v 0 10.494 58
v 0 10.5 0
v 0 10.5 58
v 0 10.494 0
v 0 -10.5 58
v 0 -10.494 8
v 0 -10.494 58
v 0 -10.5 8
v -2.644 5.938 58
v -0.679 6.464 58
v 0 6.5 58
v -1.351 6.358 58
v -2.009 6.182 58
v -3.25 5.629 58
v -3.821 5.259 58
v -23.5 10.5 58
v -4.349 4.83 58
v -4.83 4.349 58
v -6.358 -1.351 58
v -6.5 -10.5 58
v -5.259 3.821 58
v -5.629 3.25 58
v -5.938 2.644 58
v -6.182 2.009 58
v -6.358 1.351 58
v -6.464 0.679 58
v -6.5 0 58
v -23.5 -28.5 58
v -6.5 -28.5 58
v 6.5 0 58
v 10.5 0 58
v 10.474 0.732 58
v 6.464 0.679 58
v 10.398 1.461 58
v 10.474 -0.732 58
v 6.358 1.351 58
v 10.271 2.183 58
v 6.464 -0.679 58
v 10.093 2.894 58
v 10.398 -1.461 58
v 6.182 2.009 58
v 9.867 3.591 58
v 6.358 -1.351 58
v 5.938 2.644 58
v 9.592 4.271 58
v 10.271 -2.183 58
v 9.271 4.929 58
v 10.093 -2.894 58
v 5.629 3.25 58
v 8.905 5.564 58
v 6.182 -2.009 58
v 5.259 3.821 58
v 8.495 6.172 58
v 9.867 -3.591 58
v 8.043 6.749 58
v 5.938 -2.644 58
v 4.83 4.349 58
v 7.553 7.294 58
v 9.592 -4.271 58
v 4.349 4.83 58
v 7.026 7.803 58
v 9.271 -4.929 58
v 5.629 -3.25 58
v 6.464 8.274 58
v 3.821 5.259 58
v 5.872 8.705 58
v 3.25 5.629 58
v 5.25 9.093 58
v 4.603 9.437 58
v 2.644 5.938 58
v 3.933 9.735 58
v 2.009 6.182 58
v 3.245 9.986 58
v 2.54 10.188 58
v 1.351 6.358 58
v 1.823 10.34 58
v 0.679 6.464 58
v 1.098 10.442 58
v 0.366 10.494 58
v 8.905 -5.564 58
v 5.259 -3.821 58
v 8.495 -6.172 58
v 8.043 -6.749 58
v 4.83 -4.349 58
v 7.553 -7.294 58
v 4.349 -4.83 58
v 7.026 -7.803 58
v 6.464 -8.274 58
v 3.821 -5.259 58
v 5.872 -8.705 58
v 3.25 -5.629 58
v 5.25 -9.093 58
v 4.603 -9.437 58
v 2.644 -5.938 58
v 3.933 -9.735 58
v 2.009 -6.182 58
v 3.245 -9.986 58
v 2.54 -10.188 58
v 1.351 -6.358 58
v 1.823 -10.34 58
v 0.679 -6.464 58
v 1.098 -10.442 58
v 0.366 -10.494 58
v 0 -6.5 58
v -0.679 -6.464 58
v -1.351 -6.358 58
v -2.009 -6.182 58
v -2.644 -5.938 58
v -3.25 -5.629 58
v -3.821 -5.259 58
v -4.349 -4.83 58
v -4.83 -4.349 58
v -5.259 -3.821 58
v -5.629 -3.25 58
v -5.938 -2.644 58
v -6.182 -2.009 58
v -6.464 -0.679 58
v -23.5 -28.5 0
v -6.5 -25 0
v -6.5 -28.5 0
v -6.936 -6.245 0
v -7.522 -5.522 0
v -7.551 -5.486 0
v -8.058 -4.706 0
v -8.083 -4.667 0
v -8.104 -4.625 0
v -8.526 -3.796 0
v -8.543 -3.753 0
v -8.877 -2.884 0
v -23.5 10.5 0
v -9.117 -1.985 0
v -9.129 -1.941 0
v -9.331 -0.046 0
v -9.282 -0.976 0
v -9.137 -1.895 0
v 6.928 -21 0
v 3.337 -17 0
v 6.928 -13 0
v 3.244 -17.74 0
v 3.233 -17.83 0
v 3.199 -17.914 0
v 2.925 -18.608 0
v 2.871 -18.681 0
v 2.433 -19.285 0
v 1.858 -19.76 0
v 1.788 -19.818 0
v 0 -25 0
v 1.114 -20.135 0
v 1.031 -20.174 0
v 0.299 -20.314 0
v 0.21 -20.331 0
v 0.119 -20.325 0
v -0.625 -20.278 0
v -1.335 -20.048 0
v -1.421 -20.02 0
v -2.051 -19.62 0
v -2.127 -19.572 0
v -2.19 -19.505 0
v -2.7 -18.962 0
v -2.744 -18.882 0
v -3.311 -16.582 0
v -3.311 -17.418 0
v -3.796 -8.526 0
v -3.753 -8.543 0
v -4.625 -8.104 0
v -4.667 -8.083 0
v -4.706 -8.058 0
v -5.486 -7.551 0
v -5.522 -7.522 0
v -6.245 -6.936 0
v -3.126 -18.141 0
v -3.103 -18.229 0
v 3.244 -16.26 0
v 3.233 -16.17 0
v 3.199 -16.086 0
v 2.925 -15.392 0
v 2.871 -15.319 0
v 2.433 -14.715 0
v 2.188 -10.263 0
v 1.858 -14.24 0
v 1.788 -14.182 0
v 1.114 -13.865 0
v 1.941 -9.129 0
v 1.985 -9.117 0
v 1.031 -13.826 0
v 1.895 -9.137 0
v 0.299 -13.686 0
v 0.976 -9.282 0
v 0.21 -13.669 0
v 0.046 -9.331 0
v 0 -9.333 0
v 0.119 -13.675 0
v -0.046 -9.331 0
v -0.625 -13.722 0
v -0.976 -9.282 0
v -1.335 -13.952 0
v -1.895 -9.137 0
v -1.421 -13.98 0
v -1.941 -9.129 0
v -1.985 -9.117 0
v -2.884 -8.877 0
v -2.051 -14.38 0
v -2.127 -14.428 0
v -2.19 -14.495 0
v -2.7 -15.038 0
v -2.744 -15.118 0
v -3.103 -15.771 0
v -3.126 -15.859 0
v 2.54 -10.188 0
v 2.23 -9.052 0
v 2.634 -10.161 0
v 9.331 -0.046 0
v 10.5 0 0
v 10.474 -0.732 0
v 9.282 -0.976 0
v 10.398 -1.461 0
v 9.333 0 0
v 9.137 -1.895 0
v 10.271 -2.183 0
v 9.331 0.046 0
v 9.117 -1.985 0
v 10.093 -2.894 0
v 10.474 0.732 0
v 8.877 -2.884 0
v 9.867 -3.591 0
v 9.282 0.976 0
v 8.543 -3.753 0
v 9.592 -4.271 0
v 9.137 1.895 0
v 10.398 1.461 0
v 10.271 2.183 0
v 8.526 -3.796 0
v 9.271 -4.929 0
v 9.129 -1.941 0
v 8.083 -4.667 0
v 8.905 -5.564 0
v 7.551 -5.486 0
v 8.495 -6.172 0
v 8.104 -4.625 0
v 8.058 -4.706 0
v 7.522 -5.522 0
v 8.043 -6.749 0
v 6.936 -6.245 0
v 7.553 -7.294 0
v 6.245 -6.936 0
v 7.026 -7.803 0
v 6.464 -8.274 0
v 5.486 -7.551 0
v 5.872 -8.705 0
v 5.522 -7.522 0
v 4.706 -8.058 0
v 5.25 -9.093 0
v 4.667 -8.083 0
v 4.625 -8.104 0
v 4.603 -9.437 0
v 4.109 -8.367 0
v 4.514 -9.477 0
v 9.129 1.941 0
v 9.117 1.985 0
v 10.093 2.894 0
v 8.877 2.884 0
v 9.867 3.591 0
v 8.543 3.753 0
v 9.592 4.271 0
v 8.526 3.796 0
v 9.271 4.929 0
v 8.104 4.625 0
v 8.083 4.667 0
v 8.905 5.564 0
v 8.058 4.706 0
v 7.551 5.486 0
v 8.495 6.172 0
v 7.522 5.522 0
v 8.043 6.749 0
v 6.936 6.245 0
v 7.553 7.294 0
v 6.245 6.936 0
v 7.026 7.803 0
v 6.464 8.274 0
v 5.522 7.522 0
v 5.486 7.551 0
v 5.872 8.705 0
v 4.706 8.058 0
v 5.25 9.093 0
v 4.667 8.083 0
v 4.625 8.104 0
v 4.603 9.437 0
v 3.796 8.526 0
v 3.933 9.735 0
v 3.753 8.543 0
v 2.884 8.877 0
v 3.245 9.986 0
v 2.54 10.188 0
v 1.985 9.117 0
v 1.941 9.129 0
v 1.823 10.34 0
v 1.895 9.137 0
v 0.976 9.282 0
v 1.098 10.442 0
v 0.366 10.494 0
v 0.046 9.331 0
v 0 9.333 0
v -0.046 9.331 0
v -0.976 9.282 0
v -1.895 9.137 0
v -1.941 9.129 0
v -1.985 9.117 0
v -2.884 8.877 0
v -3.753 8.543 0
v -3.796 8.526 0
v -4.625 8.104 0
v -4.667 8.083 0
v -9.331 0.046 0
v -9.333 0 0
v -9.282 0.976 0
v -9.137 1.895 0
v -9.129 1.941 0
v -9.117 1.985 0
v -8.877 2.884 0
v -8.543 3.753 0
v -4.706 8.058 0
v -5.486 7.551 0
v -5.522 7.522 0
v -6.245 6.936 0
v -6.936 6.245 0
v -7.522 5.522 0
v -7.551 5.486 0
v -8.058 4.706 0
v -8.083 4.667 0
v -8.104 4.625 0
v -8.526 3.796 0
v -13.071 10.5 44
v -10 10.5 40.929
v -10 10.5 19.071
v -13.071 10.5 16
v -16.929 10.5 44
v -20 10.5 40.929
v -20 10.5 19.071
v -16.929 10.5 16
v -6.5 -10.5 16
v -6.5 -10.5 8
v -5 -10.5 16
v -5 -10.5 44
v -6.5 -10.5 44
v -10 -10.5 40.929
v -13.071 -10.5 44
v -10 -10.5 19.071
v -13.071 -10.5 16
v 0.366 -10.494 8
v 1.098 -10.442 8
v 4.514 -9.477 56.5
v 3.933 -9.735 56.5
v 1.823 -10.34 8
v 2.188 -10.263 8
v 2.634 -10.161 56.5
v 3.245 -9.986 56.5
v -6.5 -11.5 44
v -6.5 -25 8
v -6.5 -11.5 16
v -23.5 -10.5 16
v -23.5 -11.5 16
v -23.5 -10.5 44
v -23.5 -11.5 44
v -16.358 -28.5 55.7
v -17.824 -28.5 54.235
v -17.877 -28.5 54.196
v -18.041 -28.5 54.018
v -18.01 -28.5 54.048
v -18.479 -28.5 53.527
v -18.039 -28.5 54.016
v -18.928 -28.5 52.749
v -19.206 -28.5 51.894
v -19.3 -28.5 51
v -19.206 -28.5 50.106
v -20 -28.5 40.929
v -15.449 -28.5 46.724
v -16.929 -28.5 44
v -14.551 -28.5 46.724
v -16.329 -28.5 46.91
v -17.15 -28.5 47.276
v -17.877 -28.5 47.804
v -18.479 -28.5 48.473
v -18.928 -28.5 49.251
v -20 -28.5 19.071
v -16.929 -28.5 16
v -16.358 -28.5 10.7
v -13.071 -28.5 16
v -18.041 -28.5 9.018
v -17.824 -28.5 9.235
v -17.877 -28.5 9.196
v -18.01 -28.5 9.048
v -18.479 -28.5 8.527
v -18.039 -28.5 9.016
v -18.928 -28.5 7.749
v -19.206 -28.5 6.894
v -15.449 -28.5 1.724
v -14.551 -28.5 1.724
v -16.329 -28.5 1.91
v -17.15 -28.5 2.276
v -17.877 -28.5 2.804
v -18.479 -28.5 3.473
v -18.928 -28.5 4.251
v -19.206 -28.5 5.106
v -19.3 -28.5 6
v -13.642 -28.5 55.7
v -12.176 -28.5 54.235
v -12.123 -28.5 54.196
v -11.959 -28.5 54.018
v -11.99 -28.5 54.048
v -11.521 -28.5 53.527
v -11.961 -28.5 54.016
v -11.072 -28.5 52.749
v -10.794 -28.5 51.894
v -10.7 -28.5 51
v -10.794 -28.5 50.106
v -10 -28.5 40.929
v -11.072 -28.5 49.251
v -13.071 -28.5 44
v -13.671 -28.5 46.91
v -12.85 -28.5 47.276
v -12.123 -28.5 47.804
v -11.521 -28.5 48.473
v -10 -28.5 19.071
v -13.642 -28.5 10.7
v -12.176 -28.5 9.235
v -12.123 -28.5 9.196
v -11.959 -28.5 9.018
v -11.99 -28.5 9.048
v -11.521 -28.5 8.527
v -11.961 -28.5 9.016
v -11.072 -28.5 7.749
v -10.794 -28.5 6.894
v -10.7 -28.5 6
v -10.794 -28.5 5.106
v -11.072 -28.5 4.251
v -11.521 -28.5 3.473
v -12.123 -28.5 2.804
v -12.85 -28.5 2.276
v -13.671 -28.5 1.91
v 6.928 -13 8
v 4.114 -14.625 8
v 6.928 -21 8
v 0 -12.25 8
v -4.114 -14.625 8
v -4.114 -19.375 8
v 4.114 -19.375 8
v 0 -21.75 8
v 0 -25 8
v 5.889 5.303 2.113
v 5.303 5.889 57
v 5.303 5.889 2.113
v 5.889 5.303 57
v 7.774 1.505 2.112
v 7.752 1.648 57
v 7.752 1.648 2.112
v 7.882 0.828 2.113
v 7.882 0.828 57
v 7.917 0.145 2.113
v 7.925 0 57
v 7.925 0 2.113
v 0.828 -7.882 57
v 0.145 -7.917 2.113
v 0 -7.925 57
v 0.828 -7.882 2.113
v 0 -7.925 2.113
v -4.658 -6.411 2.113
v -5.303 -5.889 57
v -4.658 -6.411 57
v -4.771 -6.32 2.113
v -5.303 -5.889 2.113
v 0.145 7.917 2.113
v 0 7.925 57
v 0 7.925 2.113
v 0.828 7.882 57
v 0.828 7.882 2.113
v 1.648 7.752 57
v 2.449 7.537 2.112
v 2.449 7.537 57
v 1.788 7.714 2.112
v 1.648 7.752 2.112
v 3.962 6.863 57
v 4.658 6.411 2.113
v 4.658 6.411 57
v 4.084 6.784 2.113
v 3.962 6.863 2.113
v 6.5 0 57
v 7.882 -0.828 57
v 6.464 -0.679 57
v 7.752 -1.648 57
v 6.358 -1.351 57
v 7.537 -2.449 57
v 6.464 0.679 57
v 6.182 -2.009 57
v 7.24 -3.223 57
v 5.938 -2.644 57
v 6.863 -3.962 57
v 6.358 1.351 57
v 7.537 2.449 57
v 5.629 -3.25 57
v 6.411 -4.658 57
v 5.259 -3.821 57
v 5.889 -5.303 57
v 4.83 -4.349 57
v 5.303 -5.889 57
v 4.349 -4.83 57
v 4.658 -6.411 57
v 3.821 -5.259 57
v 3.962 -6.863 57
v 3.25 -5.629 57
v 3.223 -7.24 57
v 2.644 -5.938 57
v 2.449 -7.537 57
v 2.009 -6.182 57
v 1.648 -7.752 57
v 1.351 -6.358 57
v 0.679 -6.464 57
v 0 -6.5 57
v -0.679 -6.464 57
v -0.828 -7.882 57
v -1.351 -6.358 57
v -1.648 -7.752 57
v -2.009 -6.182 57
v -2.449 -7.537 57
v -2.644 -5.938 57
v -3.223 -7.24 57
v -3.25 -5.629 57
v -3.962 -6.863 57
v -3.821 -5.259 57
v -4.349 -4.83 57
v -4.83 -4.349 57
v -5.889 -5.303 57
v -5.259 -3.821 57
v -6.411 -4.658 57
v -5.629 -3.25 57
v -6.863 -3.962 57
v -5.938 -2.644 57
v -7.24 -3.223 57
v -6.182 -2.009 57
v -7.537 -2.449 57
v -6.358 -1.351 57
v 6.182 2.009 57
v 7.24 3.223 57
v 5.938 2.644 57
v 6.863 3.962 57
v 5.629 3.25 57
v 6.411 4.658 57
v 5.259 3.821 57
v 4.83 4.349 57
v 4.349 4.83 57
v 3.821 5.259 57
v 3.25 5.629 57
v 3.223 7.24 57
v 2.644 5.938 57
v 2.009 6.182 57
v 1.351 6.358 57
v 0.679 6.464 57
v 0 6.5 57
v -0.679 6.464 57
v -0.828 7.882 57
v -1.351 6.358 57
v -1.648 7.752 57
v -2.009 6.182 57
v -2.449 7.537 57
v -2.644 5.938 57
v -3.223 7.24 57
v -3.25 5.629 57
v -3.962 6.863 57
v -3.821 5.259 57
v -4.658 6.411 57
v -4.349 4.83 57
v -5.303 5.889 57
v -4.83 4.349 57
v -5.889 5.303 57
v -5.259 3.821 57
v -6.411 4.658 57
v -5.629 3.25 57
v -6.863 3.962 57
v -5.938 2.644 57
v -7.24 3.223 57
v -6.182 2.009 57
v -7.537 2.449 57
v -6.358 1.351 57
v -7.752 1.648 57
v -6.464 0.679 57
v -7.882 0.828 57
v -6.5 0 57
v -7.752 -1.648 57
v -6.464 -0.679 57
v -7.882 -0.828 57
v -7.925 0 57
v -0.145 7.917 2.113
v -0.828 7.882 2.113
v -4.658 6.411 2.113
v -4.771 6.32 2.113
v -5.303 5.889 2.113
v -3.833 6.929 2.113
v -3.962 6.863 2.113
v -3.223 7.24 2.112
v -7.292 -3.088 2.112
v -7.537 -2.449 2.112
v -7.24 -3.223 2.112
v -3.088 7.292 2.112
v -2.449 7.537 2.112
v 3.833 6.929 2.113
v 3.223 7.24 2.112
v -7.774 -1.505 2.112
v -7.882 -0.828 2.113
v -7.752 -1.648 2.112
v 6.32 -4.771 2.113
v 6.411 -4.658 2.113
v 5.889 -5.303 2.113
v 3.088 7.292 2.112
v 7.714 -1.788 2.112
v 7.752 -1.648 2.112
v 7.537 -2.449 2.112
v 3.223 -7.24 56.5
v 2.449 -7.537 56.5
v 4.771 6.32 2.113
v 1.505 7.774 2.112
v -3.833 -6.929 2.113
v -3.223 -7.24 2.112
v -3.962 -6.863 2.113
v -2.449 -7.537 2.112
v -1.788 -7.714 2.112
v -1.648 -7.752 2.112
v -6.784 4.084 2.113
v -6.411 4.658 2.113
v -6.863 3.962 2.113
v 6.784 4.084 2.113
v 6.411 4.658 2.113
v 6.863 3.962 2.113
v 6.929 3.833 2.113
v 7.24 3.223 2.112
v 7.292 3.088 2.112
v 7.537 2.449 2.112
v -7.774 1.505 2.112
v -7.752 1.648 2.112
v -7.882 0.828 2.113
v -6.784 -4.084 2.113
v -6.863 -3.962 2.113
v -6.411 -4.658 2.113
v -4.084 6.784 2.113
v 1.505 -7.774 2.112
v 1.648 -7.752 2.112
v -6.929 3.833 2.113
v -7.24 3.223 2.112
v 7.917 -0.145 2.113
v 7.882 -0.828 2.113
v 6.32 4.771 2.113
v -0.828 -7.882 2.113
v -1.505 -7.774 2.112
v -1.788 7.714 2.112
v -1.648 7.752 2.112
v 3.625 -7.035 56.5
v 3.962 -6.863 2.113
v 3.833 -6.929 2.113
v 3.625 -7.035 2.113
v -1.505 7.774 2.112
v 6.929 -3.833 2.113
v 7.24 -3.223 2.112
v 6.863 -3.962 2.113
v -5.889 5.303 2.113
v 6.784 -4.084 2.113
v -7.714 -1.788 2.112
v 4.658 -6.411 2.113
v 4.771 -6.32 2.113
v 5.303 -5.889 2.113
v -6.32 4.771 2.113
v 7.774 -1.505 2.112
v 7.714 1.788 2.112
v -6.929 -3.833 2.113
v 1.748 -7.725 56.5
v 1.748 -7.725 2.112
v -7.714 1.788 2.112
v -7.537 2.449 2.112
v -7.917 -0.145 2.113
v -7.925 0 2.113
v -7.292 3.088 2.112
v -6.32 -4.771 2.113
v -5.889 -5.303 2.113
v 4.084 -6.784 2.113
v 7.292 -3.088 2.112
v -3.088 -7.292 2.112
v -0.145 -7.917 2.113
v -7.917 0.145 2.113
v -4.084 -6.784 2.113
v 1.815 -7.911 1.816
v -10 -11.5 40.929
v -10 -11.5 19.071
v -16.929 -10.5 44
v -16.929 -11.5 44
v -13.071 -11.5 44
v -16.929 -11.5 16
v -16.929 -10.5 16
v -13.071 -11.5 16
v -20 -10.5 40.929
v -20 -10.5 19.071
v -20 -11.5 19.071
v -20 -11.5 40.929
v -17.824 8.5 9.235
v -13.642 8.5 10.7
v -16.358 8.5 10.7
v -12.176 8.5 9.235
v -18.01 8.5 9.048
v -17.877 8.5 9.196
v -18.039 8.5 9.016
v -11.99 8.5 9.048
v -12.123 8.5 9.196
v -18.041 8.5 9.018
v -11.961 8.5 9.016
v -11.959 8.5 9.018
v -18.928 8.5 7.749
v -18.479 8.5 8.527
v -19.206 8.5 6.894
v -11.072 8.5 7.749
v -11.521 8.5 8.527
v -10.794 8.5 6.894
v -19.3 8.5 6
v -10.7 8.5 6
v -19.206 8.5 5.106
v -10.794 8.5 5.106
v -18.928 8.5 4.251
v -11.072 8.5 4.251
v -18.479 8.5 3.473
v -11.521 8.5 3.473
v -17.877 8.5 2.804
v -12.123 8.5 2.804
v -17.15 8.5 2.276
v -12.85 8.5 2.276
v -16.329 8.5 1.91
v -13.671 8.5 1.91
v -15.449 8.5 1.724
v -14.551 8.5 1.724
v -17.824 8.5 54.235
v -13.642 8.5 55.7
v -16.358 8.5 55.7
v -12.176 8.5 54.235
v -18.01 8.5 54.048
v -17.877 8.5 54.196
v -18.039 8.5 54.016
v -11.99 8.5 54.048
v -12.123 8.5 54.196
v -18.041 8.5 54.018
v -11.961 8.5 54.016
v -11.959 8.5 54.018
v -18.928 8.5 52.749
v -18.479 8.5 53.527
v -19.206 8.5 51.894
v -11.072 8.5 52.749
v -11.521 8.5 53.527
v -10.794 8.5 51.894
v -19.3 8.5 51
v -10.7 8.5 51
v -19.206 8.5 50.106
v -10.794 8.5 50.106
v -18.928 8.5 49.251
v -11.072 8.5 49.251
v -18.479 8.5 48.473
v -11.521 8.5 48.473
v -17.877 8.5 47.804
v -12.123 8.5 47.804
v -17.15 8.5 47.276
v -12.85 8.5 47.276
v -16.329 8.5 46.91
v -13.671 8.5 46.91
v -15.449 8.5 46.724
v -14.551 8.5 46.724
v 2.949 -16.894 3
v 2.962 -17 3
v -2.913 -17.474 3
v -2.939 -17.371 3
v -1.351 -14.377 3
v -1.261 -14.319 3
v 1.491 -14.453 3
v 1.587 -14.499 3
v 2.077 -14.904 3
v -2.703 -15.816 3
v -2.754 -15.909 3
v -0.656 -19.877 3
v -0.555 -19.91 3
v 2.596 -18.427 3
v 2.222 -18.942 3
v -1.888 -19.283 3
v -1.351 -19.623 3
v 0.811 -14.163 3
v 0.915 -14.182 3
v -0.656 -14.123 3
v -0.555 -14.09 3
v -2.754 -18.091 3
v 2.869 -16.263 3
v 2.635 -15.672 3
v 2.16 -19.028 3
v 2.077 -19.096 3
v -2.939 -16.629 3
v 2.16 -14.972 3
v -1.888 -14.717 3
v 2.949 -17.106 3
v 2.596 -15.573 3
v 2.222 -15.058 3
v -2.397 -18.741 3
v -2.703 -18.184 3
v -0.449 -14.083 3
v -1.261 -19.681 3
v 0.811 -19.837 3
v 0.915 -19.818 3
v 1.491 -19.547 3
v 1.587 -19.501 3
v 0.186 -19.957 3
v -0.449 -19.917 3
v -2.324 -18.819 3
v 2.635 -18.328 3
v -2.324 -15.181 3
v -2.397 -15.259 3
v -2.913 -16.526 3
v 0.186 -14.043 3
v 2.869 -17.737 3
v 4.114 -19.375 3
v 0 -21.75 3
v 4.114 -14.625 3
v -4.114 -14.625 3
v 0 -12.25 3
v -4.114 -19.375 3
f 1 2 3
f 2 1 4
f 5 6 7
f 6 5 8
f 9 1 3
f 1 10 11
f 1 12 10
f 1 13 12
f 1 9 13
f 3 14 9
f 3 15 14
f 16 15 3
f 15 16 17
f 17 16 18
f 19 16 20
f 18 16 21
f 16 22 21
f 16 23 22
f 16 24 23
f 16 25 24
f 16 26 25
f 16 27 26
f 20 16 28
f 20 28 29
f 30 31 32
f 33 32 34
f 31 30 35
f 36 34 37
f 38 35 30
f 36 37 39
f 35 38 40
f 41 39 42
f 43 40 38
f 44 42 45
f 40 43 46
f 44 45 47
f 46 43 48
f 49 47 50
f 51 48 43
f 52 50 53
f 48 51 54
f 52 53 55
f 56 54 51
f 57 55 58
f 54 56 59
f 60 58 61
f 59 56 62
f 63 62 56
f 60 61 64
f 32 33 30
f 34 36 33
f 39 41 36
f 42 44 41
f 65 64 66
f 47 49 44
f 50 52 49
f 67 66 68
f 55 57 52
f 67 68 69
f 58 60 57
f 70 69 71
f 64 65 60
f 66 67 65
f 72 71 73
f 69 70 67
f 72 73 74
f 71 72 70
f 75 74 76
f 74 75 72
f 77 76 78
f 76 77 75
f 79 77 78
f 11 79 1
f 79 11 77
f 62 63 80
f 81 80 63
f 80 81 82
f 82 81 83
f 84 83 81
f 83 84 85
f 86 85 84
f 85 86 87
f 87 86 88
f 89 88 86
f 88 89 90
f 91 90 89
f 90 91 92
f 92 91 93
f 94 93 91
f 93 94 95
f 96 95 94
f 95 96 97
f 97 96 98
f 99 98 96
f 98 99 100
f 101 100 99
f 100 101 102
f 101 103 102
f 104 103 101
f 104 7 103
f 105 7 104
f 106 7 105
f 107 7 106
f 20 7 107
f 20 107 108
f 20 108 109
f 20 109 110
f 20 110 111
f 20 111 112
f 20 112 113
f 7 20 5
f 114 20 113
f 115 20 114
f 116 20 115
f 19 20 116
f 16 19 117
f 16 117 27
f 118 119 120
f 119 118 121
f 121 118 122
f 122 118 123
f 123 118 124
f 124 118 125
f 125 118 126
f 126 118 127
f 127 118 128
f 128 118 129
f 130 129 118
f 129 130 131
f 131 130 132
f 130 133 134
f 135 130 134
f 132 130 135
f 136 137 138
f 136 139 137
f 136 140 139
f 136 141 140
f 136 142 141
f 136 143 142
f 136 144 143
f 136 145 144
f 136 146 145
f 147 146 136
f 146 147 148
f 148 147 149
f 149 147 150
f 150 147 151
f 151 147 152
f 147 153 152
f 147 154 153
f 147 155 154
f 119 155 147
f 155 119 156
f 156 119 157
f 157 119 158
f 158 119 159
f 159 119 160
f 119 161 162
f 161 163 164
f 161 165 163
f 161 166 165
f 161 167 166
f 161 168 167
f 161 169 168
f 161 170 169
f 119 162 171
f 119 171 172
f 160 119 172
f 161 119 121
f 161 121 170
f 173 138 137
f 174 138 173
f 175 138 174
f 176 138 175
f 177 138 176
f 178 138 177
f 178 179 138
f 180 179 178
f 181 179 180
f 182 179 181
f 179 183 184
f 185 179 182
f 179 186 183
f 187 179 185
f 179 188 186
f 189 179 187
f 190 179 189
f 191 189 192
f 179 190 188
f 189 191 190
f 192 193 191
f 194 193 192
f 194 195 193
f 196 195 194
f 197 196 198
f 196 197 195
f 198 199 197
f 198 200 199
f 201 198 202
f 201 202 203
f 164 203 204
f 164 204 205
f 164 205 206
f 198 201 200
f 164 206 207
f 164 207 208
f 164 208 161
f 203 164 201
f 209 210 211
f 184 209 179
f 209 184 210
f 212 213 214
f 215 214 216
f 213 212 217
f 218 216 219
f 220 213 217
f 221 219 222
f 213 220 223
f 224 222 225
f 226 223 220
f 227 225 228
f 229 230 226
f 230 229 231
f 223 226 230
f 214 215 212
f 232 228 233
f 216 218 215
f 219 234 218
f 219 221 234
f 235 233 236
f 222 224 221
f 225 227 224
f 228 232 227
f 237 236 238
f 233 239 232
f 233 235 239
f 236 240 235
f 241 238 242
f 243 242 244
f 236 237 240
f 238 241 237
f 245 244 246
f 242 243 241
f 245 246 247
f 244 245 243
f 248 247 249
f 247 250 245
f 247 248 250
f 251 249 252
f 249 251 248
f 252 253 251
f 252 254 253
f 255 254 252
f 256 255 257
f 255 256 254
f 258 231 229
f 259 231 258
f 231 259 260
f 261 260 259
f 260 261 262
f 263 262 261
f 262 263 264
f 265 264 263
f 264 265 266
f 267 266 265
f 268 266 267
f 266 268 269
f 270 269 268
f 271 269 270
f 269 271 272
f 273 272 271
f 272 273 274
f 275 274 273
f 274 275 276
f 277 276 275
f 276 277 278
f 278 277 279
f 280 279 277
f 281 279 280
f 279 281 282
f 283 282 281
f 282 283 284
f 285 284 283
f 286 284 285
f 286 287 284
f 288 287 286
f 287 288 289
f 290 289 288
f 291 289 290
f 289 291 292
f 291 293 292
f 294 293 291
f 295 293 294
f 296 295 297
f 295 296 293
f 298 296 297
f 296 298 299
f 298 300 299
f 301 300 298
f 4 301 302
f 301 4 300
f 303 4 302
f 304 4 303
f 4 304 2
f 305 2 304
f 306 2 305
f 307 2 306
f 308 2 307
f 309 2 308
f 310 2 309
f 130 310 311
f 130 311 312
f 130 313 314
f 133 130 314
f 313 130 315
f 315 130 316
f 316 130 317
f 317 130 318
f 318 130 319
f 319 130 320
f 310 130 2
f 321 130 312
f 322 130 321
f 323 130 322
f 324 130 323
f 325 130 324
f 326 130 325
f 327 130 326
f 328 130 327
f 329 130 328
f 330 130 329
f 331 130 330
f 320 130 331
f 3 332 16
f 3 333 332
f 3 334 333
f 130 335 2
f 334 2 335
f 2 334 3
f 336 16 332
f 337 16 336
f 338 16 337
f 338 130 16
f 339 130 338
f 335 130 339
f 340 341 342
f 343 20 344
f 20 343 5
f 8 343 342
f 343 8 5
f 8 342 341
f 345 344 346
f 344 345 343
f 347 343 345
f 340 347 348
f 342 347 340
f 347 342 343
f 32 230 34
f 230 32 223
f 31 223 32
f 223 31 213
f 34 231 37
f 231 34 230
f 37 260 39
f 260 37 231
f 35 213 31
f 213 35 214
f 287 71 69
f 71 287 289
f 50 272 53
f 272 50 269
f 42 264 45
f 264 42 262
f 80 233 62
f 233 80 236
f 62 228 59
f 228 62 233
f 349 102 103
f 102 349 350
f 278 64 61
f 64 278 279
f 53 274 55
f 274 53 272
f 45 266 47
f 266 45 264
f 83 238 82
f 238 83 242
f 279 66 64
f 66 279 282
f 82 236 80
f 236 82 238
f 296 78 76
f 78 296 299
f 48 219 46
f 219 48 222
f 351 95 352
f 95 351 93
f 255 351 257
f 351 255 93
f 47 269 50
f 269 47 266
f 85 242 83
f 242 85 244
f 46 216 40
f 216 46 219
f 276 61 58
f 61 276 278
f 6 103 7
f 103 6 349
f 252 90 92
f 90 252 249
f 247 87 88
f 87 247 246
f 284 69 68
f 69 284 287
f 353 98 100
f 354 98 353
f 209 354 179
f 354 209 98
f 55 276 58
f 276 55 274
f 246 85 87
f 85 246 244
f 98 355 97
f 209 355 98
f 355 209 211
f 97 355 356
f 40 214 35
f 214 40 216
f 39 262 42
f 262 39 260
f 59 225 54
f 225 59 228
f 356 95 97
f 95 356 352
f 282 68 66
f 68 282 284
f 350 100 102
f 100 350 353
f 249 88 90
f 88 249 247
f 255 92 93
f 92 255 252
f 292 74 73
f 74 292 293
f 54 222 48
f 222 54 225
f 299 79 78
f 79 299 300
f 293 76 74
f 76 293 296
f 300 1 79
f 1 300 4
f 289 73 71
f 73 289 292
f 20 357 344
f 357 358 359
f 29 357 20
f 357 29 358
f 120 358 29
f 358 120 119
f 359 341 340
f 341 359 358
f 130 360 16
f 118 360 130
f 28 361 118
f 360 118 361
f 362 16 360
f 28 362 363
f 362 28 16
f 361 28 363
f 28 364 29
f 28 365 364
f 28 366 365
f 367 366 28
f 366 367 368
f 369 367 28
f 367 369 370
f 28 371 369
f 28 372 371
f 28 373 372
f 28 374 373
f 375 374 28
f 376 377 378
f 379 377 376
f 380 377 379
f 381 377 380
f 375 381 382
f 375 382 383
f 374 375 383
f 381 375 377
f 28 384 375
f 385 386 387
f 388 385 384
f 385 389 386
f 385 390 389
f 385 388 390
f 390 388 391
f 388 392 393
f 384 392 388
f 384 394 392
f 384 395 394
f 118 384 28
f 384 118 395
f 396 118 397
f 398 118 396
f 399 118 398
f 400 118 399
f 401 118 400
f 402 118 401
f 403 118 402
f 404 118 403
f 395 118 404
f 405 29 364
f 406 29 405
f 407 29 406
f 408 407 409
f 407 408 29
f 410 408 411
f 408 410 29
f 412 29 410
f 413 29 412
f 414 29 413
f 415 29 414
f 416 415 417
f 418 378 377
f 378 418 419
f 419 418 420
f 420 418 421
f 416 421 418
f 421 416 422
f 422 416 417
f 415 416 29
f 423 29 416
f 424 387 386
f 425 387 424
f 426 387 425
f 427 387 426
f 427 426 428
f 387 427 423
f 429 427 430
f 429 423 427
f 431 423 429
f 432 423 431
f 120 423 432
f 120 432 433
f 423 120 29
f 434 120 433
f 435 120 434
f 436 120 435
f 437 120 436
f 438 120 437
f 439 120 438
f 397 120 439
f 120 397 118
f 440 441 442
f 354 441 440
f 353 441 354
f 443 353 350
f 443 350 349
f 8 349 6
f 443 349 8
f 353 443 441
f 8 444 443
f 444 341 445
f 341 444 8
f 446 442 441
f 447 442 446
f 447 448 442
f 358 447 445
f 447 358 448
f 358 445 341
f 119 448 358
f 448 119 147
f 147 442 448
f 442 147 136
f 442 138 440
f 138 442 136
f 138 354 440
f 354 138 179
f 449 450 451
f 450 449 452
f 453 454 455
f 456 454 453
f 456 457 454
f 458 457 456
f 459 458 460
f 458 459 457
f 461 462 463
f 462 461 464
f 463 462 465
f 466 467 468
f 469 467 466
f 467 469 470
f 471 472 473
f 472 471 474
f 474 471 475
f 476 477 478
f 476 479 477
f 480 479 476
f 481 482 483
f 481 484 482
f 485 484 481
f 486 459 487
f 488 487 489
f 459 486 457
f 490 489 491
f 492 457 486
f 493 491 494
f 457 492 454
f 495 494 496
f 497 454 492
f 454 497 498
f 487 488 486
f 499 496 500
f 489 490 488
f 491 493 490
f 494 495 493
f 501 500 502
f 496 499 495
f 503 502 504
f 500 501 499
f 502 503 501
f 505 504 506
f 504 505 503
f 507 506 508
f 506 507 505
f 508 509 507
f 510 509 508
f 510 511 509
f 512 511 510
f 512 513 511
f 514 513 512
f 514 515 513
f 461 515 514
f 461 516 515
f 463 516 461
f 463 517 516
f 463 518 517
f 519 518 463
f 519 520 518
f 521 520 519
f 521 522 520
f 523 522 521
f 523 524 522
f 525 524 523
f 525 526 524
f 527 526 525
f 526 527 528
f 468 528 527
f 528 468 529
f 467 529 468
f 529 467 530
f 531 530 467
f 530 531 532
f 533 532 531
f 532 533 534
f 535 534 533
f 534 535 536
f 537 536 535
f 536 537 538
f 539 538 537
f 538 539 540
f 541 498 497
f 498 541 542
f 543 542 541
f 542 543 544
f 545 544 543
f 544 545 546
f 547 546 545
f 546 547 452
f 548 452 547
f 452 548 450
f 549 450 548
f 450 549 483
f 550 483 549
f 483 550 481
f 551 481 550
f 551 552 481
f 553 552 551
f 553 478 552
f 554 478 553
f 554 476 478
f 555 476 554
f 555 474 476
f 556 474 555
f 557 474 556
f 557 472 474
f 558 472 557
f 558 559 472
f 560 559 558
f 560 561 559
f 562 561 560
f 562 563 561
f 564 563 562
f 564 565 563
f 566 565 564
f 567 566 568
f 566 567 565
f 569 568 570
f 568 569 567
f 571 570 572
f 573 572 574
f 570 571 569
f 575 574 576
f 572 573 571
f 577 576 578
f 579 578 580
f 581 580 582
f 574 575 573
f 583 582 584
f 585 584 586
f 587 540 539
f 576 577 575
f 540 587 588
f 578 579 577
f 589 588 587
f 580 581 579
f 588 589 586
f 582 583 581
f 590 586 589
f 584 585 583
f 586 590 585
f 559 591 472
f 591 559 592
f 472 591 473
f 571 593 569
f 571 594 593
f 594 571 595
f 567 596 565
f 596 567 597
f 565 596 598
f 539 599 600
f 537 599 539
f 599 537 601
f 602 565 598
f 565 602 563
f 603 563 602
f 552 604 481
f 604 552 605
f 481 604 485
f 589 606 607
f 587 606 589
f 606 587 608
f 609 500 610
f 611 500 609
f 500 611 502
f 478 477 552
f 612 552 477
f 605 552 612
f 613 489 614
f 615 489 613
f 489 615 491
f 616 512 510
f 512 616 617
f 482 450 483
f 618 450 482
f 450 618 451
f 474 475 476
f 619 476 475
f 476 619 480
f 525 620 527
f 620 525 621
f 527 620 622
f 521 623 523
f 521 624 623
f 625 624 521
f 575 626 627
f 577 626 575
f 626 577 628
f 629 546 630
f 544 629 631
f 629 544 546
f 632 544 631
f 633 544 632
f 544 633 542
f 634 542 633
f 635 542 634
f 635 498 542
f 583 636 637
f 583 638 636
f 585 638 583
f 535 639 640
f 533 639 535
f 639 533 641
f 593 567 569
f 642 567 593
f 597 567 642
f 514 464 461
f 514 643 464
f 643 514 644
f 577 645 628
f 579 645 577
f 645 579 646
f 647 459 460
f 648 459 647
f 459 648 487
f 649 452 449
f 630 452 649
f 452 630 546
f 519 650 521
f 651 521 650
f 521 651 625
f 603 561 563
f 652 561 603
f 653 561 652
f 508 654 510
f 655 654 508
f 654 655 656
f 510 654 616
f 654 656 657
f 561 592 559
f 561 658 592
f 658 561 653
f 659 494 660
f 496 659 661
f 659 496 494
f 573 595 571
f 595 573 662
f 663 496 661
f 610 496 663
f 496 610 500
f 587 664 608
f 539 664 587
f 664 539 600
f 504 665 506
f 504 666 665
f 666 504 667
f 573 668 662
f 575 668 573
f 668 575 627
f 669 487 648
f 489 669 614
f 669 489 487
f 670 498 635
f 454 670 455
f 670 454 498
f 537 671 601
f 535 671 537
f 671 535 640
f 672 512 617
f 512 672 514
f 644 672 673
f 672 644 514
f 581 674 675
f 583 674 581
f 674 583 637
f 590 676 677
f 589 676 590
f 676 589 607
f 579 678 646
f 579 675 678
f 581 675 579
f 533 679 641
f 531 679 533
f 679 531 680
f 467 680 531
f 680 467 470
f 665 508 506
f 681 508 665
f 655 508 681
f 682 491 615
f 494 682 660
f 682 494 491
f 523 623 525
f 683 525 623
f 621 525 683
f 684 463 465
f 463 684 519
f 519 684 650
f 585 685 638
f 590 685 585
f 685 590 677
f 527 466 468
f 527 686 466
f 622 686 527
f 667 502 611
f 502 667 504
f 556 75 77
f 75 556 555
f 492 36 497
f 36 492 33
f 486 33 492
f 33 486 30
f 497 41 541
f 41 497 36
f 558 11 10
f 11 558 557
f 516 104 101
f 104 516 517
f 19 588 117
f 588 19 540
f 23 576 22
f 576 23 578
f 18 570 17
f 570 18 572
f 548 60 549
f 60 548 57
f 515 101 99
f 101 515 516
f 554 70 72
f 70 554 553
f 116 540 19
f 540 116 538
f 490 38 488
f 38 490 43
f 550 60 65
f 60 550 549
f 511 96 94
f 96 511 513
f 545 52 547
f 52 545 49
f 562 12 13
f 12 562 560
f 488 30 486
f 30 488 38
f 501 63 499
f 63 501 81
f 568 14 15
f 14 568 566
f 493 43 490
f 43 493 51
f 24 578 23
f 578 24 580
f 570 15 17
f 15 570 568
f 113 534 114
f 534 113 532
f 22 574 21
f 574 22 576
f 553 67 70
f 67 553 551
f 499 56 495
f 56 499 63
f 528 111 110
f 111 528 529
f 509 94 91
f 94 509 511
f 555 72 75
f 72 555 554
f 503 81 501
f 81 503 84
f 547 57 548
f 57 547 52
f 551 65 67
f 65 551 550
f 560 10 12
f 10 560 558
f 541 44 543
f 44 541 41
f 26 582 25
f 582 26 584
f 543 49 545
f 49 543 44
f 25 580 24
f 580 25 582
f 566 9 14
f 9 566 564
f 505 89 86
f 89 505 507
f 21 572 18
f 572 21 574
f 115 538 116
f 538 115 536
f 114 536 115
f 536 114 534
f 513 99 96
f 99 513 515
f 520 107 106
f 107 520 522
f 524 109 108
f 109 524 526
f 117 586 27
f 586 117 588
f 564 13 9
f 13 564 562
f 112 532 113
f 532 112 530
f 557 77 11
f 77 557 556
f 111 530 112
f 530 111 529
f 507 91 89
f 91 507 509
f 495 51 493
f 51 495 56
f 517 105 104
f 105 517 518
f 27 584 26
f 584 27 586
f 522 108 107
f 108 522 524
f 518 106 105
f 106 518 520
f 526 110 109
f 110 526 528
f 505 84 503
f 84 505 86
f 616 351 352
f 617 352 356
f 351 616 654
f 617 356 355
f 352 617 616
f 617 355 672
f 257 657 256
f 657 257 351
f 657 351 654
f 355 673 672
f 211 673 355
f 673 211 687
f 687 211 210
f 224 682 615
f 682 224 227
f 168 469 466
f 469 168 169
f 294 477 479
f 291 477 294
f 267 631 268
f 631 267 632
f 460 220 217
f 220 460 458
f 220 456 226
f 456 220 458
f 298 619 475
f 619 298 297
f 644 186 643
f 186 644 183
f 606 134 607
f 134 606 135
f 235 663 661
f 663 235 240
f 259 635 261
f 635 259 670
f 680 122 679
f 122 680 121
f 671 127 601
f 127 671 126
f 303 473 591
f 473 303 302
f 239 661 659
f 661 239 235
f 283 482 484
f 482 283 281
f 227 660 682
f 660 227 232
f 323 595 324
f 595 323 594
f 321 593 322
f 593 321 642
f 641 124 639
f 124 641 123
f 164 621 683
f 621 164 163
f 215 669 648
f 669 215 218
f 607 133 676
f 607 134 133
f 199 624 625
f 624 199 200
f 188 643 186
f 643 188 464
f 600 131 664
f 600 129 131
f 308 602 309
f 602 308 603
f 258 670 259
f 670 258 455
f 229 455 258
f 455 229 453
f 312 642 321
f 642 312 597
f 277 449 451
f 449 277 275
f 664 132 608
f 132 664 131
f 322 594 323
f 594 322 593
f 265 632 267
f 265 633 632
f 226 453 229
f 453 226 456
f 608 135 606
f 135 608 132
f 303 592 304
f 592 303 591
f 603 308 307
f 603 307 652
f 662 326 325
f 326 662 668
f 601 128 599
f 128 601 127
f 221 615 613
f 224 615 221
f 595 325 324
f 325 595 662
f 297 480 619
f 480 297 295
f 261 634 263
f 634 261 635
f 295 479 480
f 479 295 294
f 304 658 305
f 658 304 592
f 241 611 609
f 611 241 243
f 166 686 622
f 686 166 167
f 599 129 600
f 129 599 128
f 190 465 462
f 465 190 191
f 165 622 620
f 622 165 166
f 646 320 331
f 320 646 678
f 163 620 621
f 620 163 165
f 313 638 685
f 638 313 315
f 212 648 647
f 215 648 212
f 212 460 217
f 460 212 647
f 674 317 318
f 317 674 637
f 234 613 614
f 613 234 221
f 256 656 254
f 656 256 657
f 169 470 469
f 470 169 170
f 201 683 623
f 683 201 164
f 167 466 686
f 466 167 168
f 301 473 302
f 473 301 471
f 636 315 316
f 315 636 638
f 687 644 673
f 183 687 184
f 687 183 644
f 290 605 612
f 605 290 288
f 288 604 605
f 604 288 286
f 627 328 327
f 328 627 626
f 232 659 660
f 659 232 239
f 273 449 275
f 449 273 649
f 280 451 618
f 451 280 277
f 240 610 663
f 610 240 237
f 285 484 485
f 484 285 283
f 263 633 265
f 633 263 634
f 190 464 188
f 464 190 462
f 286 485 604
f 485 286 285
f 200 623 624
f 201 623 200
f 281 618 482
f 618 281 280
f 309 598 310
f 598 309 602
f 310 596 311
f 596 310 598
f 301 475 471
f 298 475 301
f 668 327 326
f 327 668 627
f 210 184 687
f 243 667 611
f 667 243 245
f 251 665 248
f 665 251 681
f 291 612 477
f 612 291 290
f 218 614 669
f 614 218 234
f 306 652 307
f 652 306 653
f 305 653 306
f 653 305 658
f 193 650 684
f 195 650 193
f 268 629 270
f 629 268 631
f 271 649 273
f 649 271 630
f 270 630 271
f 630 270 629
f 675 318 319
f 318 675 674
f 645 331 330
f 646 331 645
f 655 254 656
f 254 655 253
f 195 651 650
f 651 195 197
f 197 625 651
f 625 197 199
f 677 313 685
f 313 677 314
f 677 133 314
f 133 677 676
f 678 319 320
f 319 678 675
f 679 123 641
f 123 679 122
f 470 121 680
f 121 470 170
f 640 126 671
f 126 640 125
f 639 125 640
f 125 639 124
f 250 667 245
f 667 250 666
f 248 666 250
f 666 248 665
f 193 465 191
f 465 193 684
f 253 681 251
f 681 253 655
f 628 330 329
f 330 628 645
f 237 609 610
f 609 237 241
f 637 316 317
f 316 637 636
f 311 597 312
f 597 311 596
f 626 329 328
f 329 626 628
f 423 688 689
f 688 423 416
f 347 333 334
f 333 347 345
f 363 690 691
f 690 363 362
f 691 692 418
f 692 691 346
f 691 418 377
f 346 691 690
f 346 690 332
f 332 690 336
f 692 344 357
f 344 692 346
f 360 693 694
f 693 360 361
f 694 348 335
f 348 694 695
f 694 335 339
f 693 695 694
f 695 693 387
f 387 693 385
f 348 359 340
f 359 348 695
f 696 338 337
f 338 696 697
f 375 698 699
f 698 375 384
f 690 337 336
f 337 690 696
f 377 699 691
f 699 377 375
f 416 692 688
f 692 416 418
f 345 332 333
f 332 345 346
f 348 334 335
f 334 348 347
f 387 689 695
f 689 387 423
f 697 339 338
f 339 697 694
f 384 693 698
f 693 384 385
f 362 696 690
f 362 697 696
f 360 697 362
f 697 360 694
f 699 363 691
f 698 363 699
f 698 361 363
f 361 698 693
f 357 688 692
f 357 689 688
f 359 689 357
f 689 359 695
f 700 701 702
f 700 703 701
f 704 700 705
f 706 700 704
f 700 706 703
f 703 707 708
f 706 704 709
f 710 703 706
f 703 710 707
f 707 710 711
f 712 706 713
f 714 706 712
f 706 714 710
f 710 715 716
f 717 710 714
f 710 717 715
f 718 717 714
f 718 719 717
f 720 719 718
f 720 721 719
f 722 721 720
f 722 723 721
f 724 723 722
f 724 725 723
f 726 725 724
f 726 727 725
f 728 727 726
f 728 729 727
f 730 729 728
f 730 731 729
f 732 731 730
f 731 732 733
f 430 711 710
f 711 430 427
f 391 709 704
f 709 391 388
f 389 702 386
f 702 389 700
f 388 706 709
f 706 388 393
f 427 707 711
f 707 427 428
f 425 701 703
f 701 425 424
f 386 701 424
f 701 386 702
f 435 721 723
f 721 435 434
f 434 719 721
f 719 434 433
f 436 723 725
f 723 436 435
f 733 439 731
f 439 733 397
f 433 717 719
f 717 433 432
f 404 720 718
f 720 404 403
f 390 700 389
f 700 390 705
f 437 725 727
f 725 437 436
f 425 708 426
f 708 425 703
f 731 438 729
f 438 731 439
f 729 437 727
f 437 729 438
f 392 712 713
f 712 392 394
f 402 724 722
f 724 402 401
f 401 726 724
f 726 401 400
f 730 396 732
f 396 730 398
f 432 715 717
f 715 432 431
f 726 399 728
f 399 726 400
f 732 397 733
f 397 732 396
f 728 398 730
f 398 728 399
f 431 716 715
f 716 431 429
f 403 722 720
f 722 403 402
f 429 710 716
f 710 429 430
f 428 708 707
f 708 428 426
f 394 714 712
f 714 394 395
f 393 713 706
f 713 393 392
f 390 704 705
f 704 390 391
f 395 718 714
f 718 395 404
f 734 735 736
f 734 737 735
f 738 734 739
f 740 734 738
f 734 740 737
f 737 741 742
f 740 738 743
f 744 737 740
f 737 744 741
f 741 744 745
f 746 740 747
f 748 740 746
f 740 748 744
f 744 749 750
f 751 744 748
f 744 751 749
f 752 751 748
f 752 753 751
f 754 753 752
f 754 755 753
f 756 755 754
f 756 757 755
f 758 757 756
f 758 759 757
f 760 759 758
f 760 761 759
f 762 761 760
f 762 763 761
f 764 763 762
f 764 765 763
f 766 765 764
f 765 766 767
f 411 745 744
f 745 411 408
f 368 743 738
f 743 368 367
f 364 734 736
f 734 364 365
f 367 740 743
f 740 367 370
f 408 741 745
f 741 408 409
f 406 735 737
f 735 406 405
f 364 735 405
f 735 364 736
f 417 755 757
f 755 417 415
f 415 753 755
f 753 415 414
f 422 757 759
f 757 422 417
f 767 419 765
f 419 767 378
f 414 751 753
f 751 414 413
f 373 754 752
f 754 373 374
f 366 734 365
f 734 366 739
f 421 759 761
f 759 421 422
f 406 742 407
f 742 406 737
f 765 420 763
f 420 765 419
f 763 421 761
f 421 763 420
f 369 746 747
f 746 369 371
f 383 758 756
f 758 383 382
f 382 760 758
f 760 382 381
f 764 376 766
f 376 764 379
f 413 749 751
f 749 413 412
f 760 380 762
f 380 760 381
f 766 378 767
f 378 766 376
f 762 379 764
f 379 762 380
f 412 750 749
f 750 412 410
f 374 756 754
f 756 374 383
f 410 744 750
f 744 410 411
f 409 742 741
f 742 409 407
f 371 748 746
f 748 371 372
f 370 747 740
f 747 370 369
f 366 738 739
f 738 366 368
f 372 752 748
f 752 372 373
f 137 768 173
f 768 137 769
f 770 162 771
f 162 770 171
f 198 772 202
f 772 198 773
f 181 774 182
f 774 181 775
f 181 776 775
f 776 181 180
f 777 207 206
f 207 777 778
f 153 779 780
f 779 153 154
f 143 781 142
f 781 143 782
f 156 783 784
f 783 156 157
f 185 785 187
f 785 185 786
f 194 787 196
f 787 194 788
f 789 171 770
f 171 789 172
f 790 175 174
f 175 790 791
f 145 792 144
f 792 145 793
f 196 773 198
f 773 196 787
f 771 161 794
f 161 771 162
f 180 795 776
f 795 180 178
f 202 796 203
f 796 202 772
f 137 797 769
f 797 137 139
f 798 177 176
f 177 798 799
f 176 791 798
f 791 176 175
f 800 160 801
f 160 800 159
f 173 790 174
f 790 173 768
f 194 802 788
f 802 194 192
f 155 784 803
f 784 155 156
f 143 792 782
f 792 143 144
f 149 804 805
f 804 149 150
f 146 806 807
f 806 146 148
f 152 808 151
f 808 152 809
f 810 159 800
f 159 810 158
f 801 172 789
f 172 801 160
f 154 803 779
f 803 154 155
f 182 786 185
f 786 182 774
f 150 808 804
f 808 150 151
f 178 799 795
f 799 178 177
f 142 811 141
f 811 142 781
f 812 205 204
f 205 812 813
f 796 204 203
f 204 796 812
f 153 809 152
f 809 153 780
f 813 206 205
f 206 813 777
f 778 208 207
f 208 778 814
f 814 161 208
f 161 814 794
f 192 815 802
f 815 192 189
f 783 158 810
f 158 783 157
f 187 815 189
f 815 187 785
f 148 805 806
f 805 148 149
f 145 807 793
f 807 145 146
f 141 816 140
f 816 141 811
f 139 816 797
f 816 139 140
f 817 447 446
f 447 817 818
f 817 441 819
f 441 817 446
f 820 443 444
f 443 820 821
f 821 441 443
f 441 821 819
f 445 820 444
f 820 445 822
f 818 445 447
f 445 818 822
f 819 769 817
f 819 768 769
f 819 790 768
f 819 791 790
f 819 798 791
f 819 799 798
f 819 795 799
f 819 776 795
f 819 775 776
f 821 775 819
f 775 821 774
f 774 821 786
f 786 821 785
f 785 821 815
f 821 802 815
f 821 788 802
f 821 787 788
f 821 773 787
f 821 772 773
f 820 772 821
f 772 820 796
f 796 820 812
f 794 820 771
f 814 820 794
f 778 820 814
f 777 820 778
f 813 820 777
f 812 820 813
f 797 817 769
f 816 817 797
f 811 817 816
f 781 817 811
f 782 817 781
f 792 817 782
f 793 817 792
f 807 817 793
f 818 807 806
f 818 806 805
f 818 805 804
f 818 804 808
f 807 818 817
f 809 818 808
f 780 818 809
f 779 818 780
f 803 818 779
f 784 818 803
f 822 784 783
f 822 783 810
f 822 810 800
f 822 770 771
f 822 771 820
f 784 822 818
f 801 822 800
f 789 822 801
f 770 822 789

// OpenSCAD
// file: bearing.scad
// PRUSA iteration3
// Bearing holders
// GNU GPL v3
// Josef Průša <iam@josefprusa.cz> and contributors
// http://www.reprap.org/wiki/Prusa_Mendel
// http://prusamendel.org
// Alterations for Wilson by MRice <mrice411@gmail.com>

bearing_diameter = 15; 

module horizontal_bearing_base(bearings=1){
 translate(v=[0,0,6]) cube(size = [24,8+bearings*25,12], center = true);	
}
module horizontal_bearing_holes(bearings=1){
 cutter_lenght = 10+bearings*25;
 one_holder_lenght = 8+25;
 holder_lenght = 8+bearings*25;
 
 // Main bearing cut
 difference(){
  translate(v=[0,0,12]) 
      rotate(a=[90,0,0]) translate(v=[0,0,-cutter_lenght/2]) cylinder(h = cutter_lenght, r=bearing_diameter/2, $fn=50);
  // Bearing retainers
  translate(v=[0,1-holder_lenght/2,3]) cube(size = [24,6,8], center = true);
  translate(v=[0,-1+holder_lenght/2,3]) cube(size = [24,6,8], center = true);
 }
 
 // Ziptie cutouts
 ziptie_cut_ofset = 0;
 for ( i = [0 : bearings-1] ){
  // For easier positioning I move them by half of one 
  // bearing holder then add each bearign lenght and then center again
  translate(v=[0,-holder_lenght/2,0]) translate(v=[0,one_holder_lenght/2+i*25,0]) difference(){
   union(){
    translate(v=[0,2-6,12]) rotate(a=[90,0,0]) translate(v=[0,0,0]) cylinder(h = 4, r=12.5, $fn=50);
    translate(v=[0,2+6,12]) rotate(a=[90,0,0]) translate(v=[0,0,0]) cylinder(h = 4, r=12.5, $fn=50);
   }
   translate(v=[0,10,12]) rotate(a=[90,0,0]) translate(v=[0,0,0]) cylinder(h = 24, r=10, $fn=50);
  }
 }
 
}

module horizontal_bearing_test(){
 difference(){
  horizontal_bearing_base(1);
  horizontal_bearing_holes(1);
 }
 translate(v=[30,0,0]) difference(){
  horizontal_bearing_base(2);
  horizontal_bearing_holes(2);
 }
 translate(v=[60,0,0]) difference(){
  horizontal_bearing_base(3);
  horizontal_bearing_holes(3);
 }
}



thinwall = 3;
bearing_size = bearing_diameter + 2 * thinwall;

module vertical_bearing_base(){
 translate(v=[-2-bearing_size/4,0,29]) cube(size = [4+bearing_size/2,bearing_size,58], center = true);
 cylinder(h = 58, r=bearing_size/2, $fn = 90);
}

bearing_cut_extra = 0.425; // this 0.425 added to compensate for slicer error.

module vertical_bearing_holes(){
  #translate(v=[0,0,-4]) cylinder(h = 61, r=bearing_diameter/2 + bearing_cut_extra, $fn = 60);
  #translate(v=[0,0,49]) cylinder(h=10,r=bearing_diameter/2-1,$fn=60);
  #rotate(a=[0,0,-70]) translate(v=[8,0,27/*was 31.5 mjr*/]) cube(size = [5.4,2 /*was 1 mjr*/ ,59], center = true);
  #translate([0,0,-1]) cylinder(h=9,r1=bearing_diameter/2+thinwall/2+1,r2=4,$fn=60);
  //#translate([0,0,49]) cylinder(h=9,r2=bearing_diameter/2+thinwall/2,r1=4,$fn=60);
}

difference(){
vertical_bearing_base();
vertical_bearing_holes();
}
// main file
// PRUSA iteration3
// X end prototype
// GNU GPL v3
// Josef Průša <iam@josefprusa.cz> and contributors
// http://www.reprap.org/wiki/Prusa_Mendel
// http://prusamendel.org

use <bearing.scad>

rod_distance = 45;
pushfit_d = 8.6;
hex_nut_r = 4.75;

module x_end_base(){
// Main block
height = 58;
translate(v=[-15,-9,height/2]) cube(size = [17,39,height], center = true);
// Bearing holder
 vertical_bearing_base();	
//Nut trap
 // Cube
 translate(v=[-2-2,-17,4]) cube(size = [8,16,8], center = true);
 // Hexagon
 translate(v=[0,-17,0]) rotate([0,0,30]) cylinder(h = 8, r=8, $fn = 6);
}

module x_end_holes(){
 vertical_bearing_holes();
 // Belt hole
 translate(v=[-1,0,0]){
 // Stress relief
 translate(v=[-5.5-10+1.5,-10-1,30]) cube(size = [20,1,28], center = true);
 difference(){
	translate(v=[-5.5-10+1.5,-10,30]) cube(size = [10,46,28], center = true);

	// Nice edges
	translate(v=[-5.5-10+1.5,-10,30+23]) rotate([0,45,0]) cube(size = [10,46,28], center = true);
	translate(v=[-5.5-10+1.5,-10,30+23]) rotate([0,-45,0]) cube(size = [10,46,28], center = true);
	translate(v=[-5.5-10+1.5,-10,30-23]) rotate([0,45,0]) cube(size = [10,46,28], center = true);
	translate(v=[-5.5-10+1.5,-10,30-23]) rotate([0,-45,0]) cube(size = [10,46,28], center = true);

}
}



// Bottom pushfit rod
translate(v=[-15,-41.5,6]) rotate(a=[-90,0,0]) pushfit_rod(pushfit_d,50);
// Top pushfit rod
translate(v=[-15,-41.5,rod_distance+6]) rotate(a=[-90,0,0]) pushfit_rod(pushfit_d,50);
// Nut trap
 #translate(v=[0,-17,-0.5]) cylinder(h = 4, r1=3.4, r2=2.9, $fn=25);
 translate(v=[0,-17,3]) rotate([0,0,30]) cylinder(h = 10, r=hex_nut_r, $fn = 6);
}


// Final prototype
module x_end_plain(){
 difference(){
  x_end_base();
  x_end_holes();
 }
}

x_end_plain();


module pushfit_rod(diameter,length){
 cylinder(h = length, r=diameter/2, $fn=30);
 difference(){
 	translate(v=[0,-diameter/2.85,length/2]) rotate([0,0,45]) cube(size = [diameter/2,diameter/2,length], center = true);
 	translate(v=[0,-diameter/4-diameter/2-0.4,length/2]) rotate([0,0,0]) cube(size = [diameter,diameter/2,length], center = true);
 }
 //translate(v=[0,-diameter/2-2,length/2]) cube(size = [diameter,1,length], center = true);
}
